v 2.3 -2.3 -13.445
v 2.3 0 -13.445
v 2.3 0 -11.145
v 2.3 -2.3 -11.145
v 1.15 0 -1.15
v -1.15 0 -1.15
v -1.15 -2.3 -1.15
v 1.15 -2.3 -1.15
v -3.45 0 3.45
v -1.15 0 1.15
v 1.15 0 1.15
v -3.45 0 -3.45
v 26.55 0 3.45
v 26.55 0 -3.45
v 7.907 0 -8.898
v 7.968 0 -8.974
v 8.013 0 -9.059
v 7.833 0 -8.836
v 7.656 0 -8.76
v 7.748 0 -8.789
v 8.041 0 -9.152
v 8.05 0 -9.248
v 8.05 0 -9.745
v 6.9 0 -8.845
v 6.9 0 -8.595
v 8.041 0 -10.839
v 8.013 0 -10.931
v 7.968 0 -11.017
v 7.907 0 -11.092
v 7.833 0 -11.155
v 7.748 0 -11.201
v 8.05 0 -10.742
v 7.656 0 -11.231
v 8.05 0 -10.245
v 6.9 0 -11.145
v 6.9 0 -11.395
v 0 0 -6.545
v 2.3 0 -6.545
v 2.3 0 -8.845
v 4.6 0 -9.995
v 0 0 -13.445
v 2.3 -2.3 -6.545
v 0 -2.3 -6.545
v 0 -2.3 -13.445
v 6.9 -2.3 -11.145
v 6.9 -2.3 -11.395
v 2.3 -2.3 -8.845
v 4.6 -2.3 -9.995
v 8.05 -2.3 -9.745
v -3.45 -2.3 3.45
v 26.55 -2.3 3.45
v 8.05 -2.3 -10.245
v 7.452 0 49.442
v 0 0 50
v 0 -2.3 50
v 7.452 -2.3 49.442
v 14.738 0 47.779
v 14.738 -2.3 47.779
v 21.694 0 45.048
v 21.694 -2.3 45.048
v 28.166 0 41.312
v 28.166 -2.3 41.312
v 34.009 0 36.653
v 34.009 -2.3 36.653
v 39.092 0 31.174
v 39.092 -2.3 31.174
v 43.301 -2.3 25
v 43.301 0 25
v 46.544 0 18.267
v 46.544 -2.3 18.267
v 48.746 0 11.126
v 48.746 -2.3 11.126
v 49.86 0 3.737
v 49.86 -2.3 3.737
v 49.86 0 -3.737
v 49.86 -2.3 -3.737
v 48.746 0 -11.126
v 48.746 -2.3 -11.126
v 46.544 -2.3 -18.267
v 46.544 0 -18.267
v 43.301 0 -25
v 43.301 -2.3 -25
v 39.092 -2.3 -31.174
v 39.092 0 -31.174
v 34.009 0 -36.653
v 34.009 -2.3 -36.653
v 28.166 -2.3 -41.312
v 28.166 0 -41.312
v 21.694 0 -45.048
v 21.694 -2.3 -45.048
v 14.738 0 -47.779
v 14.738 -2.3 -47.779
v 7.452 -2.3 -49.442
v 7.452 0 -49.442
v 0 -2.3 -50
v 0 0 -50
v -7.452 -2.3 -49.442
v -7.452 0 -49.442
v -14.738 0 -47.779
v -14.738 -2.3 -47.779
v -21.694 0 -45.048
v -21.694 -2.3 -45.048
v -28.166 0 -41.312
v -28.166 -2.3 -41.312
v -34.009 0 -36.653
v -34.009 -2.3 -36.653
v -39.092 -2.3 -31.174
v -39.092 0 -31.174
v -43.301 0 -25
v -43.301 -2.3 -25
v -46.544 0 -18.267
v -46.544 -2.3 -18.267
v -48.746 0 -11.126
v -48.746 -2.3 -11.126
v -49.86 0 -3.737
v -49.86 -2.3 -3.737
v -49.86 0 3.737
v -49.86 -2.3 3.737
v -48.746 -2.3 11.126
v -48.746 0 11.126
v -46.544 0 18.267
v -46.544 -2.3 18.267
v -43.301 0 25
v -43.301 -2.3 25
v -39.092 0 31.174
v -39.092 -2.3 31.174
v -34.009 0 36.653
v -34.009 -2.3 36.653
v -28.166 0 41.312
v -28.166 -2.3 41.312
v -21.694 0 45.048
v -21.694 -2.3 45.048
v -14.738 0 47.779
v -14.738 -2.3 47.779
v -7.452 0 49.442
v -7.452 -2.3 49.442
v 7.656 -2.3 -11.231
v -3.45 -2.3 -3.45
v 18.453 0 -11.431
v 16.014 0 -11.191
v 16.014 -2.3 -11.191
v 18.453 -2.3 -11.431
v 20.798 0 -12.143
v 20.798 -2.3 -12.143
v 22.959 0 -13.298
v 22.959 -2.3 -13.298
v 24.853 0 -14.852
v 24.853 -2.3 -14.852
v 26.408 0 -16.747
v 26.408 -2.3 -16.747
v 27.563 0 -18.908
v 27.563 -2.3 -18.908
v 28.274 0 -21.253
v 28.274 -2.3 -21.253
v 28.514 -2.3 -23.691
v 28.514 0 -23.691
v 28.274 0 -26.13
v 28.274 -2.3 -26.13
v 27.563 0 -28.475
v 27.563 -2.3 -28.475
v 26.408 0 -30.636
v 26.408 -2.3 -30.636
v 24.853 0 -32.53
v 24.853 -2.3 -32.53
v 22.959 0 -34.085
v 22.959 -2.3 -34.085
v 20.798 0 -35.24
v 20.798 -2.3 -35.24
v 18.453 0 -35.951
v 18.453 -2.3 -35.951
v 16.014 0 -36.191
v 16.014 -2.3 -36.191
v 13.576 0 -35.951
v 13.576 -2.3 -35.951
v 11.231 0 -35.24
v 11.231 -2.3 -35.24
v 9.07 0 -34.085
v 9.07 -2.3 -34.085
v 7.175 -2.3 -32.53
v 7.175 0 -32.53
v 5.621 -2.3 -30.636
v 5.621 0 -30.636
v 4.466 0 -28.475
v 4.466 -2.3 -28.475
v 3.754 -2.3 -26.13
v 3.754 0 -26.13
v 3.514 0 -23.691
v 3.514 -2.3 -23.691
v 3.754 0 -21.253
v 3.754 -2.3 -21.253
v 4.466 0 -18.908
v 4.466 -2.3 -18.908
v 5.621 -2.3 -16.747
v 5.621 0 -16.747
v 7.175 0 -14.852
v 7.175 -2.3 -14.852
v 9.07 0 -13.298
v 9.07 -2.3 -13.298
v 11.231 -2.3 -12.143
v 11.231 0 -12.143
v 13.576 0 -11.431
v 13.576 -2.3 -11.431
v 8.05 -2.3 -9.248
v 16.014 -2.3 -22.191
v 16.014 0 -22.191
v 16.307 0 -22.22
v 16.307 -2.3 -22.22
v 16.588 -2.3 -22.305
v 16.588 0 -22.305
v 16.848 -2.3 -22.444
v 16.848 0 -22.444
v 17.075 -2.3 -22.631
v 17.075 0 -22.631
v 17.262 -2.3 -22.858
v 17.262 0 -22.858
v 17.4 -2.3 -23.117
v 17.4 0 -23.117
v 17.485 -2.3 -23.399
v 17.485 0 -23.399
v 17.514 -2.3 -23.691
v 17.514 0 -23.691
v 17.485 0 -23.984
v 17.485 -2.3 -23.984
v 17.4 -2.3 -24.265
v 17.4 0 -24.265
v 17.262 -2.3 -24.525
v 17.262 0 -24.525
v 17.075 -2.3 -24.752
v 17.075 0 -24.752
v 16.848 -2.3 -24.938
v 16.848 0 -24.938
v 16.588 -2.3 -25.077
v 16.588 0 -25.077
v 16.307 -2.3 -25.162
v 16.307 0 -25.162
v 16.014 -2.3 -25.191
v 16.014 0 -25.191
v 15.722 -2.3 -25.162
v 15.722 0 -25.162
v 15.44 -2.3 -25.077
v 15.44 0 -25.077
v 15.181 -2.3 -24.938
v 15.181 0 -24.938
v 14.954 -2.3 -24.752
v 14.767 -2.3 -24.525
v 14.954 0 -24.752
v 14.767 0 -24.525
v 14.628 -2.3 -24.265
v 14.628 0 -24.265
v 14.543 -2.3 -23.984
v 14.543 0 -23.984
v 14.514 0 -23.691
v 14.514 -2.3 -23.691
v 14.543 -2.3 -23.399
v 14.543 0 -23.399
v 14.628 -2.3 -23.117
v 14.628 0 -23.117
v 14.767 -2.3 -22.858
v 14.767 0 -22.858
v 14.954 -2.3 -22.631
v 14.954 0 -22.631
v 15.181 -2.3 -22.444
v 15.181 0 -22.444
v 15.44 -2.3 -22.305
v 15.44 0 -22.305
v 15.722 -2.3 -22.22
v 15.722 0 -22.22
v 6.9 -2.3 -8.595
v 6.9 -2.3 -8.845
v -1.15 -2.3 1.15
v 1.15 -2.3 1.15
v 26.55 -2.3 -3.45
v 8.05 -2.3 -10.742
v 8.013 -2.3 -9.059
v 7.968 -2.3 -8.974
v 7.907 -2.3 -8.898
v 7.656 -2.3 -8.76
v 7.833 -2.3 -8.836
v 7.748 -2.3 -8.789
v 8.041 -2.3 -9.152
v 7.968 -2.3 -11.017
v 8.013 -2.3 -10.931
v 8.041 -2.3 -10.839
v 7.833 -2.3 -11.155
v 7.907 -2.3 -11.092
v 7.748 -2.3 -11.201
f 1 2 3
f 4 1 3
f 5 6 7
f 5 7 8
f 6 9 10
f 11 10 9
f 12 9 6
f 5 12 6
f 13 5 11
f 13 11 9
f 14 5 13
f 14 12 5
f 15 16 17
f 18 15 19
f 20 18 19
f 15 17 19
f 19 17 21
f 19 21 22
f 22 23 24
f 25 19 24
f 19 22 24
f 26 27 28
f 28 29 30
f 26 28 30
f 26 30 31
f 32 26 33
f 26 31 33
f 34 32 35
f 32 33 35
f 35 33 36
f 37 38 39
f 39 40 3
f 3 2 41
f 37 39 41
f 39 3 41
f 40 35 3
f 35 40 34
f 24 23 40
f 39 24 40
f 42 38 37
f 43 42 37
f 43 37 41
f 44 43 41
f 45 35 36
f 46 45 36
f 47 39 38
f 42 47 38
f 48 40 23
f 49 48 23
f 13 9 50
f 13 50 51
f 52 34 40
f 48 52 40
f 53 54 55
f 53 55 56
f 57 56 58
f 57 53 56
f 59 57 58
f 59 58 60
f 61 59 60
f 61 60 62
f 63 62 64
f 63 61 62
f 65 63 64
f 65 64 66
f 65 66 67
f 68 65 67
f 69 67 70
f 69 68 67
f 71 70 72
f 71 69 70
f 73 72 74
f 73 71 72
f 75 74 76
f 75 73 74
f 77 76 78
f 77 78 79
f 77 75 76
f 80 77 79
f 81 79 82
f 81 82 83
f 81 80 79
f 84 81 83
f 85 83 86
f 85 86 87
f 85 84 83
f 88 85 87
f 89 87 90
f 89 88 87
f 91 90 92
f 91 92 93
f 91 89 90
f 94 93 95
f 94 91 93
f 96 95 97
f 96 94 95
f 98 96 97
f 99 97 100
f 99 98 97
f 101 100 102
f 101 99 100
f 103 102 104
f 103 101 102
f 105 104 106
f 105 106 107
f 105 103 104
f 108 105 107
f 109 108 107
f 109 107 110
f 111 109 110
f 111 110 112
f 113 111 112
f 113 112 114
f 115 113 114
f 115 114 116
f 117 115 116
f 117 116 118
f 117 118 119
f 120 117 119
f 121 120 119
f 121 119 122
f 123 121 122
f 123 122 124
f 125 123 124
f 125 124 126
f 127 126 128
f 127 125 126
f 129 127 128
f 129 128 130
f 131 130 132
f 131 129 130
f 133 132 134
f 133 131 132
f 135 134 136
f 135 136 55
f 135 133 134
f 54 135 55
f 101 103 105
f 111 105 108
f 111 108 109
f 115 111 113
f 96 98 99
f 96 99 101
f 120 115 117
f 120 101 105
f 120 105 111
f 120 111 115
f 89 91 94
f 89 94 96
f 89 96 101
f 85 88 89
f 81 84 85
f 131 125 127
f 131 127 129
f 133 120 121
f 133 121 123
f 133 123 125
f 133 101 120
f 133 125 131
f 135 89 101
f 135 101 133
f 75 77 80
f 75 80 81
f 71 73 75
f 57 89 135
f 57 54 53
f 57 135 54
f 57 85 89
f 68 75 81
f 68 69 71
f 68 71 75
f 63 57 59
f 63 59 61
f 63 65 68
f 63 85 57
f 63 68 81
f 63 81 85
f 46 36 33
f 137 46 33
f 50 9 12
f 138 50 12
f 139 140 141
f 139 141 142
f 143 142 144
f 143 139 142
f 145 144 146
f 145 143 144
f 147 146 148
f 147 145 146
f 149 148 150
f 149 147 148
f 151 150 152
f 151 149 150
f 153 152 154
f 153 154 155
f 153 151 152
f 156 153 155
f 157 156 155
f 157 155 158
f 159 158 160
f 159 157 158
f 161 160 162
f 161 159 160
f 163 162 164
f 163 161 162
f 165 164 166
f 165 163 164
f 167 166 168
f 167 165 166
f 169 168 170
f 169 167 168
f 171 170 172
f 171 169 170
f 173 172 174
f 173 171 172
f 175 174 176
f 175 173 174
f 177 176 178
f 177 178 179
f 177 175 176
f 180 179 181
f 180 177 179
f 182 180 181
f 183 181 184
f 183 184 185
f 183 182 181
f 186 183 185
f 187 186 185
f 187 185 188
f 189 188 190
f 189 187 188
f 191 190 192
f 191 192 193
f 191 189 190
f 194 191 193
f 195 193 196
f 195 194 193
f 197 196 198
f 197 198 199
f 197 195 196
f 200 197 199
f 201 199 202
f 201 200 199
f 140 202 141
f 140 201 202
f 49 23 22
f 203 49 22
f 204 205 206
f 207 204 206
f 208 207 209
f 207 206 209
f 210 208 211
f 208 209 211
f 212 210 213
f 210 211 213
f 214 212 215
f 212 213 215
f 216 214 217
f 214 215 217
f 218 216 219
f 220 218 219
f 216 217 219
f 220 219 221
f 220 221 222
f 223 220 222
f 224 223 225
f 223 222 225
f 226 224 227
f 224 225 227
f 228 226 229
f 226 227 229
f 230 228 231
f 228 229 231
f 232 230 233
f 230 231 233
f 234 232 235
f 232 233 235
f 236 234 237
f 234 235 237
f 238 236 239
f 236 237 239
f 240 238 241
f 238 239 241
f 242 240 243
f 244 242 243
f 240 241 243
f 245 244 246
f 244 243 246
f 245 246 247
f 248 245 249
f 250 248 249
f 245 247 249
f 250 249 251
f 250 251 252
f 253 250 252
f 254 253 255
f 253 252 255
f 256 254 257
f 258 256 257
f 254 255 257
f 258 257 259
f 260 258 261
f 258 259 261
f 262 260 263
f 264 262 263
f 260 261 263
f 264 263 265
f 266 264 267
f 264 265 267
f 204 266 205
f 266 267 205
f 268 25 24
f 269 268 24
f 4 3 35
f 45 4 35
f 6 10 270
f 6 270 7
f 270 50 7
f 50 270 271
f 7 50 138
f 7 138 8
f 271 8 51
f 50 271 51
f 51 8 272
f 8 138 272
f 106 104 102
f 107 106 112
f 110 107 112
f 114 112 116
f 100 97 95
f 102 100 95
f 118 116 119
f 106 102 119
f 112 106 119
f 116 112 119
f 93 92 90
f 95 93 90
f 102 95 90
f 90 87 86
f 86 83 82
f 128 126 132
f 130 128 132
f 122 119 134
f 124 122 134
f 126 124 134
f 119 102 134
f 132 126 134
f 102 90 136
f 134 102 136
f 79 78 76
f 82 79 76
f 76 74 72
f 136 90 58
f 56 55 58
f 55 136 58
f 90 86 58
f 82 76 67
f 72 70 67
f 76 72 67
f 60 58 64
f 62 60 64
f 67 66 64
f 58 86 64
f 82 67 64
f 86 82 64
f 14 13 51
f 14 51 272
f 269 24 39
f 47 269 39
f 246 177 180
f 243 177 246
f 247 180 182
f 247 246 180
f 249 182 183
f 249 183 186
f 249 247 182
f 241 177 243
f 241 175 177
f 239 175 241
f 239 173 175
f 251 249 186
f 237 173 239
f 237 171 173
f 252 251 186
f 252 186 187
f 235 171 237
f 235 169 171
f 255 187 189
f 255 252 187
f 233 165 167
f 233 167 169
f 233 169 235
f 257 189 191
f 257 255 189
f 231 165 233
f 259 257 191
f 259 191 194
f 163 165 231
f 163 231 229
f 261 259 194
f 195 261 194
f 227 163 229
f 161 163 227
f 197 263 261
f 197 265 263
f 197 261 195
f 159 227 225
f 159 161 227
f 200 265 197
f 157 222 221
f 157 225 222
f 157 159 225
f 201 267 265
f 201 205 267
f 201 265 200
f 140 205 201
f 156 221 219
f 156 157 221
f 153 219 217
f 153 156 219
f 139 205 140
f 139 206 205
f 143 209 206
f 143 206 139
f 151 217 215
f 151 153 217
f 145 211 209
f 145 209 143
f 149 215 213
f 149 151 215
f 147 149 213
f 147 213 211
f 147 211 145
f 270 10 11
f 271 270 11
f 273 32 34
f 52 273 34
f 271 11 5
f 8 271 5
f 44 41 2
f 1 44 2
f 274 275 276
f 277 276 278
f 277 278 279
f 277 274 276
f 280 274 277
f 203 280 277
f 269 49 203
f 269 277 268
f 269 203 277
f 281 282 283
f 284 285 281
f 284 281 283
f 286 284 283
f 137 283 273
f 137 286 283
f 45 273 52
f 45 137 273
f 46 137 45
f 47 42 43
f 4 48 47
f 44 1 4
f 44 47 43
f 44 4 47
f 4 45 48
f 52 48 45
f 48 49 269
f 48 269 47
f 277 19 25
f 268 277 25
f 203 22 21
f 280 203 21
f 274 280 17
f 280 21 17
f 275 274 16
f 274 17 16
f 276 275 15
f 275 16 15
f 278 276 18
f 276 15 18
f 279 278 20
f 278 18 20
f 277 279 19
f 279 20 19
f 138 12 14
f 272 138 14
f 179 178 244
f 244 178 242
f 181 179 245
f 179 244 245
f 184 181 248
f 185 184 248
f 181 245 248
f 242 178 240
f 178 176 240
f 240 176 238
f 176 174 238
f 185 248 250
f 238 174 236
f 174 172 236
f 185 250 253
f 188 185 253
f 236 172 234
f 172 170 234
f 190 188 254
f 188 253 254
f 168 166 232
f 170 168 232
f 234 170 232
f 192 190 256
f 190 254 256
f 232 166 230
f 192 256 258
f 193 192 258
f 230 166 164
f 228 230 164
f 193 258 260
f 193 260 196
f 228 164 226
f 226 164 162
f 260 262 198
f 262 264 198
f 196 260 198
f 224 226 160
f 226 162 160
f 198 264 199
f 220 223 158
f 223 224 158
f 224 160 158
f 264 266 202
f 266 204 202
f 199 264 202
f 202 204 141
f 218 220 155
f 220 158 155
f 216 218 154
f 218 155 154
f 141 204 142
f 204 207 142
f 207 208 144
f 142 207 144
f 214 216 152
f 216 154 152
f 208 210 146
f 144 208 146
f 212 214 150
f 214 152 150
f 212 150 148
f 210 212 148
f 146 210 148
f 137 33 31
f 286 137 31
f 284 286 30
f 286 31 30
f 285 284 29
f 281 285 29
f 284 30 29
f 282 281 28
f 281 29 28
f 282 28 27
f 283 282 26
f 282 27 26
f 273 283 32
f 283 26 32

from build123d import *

# Parameters (mm, degrees)
SKETCH1_W          = 30
SKETCH1_H          = 6.9
SKETCH1_W_2        = 2.3
SKETCH1_H_2        = 2.3
BASE_FLANGE1_DEPTH = 2.3
BASE_FLANGE2_DEPTH = 2.3
SKETCH9_R          = 12.5
SKETCH9_R_2        = 1.5
BASE_FLANGE3_DEPTH = 2.3
SKETCH10_R         = 50
BASE_FLANGE4_DEPTH = 2.3


# Sheet-metal steps are written as plain solids
with BuildPart() as part:
    # Sketch1 → Base-Flange1 (new body)
    with BuildSketch(Plane(origin=(0, 0, 0), x_dir=(1, 0, 0), z_dir=(0, 1, 0))):
        with Locations((11.55, 0)):
            Rectangle(SKETCH1_W, SKETCH1_H)
        Rectangle(SKETCH1_W_2, SKETCH1_H_2, mode=Mode.SUBTRACT)
    extrude(amount=-BASE_FLANGE1_DEPTH)


with BuildPart() as body_2:
    # Sketch6 → Base-Flange2 (new body)
    with BuildSketch(Plane(origin=(0, 0, 0), x_dir=(1, 0, 0), z_dir=(0, 1, 0))):
        with BuildLine():
            Line((0, 13.445456408), (2.3, 13.445456408))
            Line((2.3, 13.445456408), (2.3, 11.145456408))
            Line((2.3, 11.145456408), (6.9, 11.145456408))
            Line((6.9, 11.145456408), (6.9, 11.395456408))
            Line((6.9, 11.395456408), (7.656214822, 11.231061881))
            ThreePointArc((7.656214822, 11.231061881), (7.939298992, 11.056235224), (8.05, 10.742473699))
            Line((8.05, 10.742473699), (8.05, 10.245456408))
            Line((8.05, 10.245456408), (4.6, 9.995456408))
            Line((4.6, 9.995456408), (8.05, 9.745456408))
            Line((8.05, 9.745456408), (8.05, 9.248439116))
            ThreePointArc((8.05, 9.248439116), (7.939298992, 8.934677592), (7.656214822, 8.759850934))
            Line((7.656214822, 8.759850934), (6.9, 8.595456408))
            Line((6.9, 8.595456408), (6.9, 8.845456408))
            Line((6.9, 8.845456408), (2.3, 8.845456408))
            Line((2.3, 8.845456408), (2.3, 6.545456408))
            Line((2.3, 6.545456408), (0, 6.545456408))
            Line((0, 6.545456408), (0, 13.445456408))
        make_face()
    extrude(amount=-BASE_FLANGE2_DEPTH)


with BuildPart() as body_3:
    # Sketch9 → Base-Flange3 (new body)
    with BuildSketch(Plane(origin=(0, 0, 0), x_dir=(1, 0, 0), z_dir=(0, 1, 0))):
        with Locations(Location((16.014309717, 23.691171103, 0), (0, 0, 270))):
            Circle(SKETCH9_R)
        with Locations(Location((16.014309717, 23.691171103, 0), (0, 0, 270))):
            Circle(SKETCH9_R_2, mode=Mode.SUBTRACT)
    extrude(amount=-BASE_FLANGE3_DEPTH)


with BuildPart() as body_4:
    # Sketch10 → Base-Flange4 (new body)
    with BuildSketch(Plane(origin=(0, 0, 0), x_dir=(1, 0, 0), z_dir=(0, 1, 0))):
        with Locations(Location((0, 0, 0), (0, 0, 270))):
            Circle(SKETCH10_R)
    extrude(amount=-BASE_FLANGE4_DEPTH)


solid = Compound([part.part, body_2.part, body_3.part, body_4.part])
